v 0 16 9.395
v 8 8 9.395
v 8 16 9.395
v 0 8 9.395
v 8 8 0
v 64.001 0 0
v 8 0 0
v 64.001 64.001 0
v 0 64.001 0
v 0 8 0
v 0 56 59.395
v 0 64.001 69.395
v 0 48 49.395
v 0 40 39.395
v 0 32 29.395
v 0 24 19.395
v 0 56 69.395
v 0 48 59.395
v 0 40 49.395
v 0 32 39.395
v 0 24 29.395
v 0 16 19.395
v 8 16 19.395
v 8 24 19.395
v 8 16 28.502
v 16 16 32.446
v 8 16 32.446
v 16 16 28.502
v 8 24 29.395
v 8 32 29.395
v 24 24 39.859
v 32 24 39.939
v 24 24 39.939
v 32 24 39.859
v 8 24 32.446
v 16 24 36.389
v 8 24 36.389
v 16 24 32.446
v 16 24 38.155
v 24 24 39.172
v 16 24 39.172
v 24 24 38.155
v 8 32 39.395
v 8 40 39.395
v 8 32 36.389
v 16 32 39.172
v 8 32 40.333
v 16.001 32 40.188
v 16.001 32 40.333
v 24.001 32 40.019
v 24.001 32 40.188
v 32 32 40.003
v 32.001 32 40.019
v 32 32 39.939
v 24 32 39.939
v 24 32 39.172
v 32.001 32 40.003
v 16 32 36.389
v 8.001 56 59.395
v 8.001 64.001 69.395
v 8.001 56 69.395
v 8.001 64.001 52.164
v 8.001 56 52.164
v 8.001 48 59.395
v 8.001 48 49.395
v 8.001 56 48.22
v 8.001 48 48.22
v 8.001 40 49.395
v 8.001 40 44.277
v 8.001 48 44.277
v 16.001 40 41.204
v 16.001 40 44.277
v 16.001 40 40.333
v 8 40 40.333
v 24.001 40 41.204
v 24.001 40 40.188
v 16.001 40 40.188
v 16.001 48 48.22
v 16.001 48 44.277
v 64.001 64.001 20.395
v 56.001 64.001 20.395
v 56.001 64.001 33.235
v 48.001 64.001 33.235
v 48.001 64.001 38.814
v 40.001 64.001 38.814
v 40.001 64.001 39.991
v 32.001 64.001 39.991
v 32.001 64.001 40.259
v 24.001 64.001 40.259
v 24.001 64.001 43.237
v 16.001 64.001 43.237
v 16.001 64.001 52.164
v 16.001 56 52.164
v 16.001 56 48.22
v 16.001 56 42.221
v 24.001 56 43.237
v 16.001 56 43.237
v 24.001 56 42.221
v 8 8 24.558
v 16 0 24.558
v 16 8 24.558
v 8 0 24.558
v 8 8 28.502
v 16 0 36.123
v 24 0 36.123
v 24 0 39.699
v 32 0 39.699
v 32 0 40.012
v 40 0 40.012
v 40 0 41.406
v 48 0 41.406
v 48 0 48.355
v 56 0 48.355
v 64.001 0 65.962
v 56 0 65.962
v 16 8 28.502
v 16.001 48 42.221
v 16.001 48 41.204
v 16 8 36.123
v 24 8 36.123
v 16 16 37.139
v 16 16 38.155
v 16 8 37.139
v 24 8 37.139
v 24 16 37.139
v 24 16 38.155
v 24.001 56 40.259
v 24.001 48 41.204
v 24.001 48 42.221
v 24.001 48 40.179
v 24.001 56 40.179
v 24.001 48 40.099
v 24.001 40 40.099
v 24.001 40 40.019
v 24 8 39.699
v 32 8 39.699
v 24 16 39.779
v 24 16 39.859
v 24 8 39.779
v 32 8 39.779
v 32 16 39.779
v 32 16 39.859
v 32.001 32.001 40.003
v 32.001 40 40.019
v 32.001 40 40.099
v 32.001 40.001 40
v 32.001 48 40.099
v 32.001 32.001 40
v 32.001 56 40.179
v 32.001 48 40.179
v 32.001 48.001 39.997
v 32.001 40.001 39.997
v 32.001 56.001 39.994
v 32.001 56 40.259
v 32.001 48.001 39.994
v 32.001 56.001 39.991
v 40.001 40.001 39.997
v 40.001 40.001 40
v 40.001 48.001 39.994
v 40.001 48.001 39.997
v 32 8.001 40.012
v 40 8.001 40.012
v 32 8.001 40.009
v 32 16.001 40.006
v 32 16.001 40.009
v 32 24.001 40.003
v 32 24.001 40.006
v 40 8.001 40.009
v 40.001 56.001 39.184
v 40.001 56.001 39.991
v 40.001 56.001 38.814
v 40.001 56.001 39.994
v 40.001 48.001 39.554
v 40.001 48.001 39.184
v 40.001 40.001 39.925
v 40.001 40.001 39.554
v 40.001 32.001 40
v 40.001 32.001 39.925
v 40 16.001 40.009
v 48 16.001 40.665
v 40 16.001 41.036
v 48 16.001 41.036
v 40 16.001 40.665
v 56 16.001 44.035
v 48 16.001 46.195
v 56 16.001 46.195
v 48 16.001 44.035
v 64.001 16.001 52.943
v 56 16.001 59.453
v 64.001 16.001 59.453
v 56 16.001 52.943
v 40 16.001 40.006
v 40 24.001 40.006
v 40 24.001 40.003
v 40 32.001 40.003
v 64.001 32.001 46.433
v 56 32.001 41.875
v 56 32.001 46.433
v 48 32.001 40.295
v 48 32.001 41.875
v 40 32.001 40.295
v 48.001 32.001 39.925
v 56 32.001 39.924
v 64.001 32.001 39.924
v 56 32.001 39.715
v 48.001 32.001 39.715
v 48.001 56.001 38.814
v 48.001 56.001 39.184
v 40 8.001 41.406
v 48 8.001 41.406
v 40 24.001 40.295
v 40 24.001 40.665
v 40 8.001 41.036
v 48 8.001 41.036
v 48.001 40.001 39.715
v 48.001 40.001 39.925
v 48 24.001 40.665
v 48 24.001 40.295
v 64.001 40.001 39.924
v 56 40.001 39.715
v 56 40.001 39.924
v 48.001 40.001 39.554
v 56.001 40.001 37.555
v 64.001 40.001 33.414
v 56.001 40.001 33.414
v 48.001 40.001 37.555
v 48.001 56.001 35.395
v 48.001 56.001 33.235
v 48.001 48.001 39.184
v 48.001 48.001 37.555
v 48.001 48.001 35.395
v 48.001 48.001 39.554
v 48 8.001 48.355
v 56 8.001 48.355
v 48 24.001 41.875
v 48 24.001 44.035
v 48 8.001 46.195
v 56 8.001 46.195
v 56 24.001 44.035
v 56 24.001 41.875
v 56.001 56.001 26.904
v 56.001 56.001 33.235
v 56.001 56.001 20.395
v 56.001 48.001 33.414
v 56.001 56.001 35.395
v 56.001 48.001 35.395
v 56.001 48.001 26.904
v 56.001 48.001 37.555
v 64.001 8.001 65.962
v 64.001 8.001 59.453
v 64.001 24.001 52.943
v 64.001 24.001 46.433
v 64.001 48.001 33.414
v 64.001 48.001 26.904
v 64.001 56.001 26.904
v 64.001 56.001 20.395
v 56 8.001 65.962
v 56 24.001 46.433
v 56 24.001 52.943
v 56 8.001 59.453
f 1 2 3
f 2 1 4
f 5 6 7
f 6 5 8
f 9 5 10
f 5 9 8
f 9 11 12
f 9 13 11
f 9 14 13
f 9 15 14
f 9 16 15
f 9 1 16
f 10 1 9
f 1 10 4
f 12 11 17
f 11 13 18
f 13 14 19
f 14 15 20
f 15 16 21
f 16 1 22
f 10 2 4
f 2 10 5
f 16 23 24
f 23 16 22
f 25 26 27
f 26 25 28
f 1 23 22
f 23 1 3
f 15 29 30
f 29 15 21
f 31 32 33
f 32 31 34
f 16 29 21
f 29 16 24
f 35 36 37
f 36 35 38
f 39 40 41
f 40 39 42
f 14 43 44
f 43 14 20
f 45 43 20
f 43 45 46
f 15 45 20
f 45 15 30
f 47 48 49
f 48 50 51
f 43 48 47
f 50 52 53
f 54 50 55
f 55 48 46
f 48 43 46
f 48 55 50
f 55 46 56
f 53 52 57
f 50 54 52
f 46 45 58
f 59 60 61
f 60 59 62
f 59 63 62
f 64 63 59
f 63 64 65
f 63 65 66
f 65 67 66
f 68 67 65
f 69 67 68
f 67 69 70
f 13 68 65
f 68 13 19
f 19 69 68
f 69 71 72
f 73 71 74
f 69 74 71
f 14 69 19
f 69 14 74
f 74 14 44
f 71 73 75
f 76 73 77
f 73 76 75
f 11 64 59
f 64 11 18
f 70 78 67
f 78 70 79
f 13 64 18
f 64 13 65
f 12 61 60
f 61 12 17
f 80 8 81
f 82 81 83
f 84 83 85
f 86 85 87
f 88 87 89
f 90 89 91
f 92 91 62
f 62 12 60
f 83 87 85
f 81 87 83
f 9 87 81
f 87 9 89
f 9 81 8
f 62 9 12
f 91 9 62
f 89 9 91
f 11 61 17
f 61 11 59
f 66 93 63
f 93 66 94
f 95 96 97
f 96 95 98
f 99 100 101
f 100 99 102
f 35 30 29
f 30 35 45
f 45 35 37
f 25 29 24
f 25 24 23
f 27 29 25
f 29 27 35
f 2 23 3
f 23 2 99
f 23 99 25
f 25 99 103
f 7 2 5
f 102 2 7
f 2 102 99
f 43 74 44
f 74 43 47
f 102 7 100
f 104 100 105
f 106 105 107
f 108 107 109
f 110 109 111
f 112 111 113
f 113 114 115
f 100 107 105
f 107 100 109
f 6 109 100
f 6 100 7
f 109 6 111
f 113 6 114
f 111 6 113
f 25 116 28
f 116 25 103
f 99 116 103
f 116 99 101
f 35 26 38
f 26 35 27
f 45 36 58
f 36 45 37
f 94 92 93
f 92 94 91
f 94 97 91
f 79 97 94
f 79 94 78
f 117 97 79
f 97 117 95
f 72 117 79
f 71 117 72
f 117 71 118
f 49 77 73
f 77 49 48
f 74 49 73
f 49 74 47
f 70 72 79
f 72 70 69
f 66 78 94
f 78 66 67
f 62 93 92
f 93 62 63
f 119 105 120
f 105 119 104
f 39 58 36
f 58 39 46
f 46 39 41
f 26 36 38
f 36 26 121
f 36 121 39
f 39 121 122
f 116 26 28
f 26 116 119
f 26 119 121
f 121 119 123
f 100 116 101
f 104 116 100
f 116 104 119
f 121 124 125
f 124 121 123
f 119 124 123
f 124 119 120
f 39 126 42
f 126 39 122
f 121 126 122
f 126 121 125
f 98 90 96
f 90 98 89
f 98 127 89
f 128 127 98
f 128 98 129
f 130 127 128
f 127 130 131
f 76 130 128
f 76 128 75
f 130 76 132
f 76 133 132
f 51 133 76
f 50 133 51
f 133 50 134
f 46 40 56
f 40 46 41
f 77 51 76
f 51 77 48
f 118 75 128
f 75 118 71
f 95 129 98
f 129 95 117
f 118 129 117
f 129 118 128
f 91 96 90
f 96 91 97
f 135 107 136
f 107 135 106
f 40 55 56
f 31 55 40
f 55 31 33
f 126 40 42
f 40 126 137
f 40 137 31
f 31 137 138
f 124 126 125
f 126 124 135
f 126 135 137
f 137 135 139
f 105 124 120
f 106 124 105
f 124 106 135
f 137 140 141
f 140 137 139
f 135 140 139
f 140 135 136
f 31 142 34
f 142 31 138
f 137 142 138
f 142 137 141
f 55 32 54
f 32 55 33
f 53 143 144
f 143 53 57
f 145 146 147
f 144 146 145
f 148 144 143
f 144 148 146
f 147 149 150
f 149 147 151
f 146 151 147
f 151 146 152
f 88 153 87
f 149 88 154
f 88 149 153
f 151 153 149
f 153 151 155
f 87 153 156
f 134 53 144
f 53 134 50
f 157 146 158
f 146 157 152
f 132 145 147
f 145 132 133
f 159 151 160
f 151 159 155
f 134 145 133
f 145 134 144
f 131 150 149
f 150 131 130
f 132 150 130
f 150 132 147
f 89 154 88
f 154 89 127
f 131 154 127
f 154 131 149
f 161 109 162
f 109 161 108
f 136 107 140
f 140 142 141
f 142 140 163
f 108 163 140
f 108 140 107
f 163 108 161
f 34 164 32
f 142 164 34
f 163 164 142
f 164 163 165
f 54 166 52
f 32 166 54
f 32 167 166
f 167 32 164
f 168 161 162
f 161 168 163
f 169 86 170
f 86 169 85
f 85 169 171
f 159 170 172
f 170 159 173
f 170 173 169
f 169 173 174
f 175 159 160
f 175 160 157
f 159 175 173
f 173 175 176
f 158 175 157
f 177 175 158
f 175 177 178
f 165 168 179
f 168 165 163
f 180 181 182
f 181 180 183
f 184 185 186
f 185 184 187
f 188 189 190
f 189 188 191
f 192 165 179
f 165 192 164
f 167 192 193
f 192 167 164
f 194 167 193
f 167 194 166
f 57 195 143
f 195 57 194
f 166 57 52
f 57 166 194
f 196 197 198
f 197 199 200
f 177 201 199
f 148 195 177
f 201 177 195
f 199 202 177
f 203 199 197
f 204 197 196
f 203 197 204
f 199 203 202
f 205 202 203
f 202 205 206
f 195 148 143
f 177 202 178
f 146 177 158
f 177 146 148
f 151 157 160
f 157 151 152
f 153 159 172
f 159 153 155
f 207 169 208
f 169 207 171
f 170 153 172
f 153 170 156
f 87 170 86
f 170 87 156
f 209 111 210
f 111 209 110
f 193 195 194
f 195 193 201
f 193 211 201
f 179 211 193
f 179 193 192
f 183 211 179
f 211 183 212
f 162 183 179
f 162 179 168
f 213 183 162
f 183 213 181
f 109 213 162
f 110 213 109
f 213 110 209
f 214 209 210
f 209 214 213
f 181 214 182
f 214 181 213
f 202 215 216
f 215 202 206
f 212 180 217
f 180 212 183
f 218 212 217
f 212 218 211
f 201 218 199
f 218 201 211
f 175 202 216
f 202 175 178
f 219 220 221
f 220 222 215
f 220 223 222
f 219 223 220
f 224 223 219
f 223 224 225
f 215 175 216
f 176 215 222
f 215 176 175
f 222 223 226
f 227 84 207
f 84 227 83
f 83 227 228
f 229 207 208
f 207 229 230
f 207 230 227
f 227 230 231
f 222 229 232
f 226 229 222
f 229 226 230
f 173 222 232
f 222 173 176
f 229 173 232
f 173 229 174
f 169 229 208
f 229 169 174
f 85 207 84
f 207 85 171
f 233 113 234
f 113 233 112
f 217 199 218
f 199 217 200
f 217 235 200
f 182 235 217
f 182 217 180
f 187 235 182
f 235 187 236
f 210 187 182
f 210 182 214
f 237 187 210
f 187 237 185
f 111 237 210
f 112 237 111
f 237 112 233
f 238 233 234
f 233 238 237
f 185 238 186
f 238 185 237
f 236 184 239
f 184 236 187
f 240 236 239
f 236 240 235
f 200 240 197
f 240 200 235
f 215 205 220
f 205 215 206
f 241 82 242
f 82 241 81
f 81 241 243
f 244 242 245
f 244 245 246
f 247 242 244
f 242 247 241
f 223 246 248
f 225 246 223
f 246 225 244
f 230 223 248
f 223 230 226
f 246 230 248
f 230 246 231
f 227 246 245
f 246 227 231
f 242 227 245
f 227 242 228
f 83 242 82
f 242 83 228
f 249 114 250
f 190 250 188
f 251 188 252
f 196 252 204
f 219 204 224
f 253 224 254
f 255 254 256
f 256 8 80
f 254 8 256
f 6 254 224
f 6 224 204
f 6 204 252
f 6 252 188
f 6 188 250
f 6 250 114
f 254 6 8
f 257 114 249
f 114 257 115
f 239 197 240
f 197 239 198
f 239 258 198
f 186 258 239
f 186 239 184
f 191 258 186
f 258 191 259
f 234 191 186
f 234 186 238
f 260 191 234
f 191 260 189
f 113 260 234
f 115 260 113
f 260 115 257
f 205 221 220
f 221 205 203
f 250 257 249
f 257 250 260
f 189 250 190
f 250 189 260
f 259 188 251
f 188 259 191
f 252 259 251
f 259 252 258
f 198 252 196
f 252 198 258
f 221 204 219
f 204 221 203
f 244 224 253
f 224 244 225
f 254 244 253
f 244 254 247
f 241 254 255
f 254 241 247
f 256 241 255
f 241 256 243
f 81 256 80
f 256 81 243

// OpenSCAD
// OpenSCAD model to print out an arbitrary surface defined as z = f(x,y)
// Either prints the surface as two sided and variable thick = thickness
// Or if thick = 0, prints a top surface with a flat bottom
// File surfaceprint.scad
 
 a = -10;
 b = 1;
 c=1 ;
 xscale = 6;
 zscale=1000;
 center = 30;
function f(x, y) = 40 + (pow((x - center) / xscale, 5) + a * (y - center) * pow((x - center) / xscale, 3) + b * pow((x - center) / xscale, 2) + c * ((x - center) / xscale)) / zscale; // Saddle point 

res = 8;
 
//z height, in mm

thick = 0; //set to 0 for flat bottom. else mm thickness of surface
xmax = 60; //Number of points in x direction - 99 is the max
ymax = 60; // Number of points in y direction - 99 is the max

for(x = [0:res:xmax], y = [0:res:ymax]) translate([x, y, 0]) cube([res + .001, res + .001, f(x, y)]);
